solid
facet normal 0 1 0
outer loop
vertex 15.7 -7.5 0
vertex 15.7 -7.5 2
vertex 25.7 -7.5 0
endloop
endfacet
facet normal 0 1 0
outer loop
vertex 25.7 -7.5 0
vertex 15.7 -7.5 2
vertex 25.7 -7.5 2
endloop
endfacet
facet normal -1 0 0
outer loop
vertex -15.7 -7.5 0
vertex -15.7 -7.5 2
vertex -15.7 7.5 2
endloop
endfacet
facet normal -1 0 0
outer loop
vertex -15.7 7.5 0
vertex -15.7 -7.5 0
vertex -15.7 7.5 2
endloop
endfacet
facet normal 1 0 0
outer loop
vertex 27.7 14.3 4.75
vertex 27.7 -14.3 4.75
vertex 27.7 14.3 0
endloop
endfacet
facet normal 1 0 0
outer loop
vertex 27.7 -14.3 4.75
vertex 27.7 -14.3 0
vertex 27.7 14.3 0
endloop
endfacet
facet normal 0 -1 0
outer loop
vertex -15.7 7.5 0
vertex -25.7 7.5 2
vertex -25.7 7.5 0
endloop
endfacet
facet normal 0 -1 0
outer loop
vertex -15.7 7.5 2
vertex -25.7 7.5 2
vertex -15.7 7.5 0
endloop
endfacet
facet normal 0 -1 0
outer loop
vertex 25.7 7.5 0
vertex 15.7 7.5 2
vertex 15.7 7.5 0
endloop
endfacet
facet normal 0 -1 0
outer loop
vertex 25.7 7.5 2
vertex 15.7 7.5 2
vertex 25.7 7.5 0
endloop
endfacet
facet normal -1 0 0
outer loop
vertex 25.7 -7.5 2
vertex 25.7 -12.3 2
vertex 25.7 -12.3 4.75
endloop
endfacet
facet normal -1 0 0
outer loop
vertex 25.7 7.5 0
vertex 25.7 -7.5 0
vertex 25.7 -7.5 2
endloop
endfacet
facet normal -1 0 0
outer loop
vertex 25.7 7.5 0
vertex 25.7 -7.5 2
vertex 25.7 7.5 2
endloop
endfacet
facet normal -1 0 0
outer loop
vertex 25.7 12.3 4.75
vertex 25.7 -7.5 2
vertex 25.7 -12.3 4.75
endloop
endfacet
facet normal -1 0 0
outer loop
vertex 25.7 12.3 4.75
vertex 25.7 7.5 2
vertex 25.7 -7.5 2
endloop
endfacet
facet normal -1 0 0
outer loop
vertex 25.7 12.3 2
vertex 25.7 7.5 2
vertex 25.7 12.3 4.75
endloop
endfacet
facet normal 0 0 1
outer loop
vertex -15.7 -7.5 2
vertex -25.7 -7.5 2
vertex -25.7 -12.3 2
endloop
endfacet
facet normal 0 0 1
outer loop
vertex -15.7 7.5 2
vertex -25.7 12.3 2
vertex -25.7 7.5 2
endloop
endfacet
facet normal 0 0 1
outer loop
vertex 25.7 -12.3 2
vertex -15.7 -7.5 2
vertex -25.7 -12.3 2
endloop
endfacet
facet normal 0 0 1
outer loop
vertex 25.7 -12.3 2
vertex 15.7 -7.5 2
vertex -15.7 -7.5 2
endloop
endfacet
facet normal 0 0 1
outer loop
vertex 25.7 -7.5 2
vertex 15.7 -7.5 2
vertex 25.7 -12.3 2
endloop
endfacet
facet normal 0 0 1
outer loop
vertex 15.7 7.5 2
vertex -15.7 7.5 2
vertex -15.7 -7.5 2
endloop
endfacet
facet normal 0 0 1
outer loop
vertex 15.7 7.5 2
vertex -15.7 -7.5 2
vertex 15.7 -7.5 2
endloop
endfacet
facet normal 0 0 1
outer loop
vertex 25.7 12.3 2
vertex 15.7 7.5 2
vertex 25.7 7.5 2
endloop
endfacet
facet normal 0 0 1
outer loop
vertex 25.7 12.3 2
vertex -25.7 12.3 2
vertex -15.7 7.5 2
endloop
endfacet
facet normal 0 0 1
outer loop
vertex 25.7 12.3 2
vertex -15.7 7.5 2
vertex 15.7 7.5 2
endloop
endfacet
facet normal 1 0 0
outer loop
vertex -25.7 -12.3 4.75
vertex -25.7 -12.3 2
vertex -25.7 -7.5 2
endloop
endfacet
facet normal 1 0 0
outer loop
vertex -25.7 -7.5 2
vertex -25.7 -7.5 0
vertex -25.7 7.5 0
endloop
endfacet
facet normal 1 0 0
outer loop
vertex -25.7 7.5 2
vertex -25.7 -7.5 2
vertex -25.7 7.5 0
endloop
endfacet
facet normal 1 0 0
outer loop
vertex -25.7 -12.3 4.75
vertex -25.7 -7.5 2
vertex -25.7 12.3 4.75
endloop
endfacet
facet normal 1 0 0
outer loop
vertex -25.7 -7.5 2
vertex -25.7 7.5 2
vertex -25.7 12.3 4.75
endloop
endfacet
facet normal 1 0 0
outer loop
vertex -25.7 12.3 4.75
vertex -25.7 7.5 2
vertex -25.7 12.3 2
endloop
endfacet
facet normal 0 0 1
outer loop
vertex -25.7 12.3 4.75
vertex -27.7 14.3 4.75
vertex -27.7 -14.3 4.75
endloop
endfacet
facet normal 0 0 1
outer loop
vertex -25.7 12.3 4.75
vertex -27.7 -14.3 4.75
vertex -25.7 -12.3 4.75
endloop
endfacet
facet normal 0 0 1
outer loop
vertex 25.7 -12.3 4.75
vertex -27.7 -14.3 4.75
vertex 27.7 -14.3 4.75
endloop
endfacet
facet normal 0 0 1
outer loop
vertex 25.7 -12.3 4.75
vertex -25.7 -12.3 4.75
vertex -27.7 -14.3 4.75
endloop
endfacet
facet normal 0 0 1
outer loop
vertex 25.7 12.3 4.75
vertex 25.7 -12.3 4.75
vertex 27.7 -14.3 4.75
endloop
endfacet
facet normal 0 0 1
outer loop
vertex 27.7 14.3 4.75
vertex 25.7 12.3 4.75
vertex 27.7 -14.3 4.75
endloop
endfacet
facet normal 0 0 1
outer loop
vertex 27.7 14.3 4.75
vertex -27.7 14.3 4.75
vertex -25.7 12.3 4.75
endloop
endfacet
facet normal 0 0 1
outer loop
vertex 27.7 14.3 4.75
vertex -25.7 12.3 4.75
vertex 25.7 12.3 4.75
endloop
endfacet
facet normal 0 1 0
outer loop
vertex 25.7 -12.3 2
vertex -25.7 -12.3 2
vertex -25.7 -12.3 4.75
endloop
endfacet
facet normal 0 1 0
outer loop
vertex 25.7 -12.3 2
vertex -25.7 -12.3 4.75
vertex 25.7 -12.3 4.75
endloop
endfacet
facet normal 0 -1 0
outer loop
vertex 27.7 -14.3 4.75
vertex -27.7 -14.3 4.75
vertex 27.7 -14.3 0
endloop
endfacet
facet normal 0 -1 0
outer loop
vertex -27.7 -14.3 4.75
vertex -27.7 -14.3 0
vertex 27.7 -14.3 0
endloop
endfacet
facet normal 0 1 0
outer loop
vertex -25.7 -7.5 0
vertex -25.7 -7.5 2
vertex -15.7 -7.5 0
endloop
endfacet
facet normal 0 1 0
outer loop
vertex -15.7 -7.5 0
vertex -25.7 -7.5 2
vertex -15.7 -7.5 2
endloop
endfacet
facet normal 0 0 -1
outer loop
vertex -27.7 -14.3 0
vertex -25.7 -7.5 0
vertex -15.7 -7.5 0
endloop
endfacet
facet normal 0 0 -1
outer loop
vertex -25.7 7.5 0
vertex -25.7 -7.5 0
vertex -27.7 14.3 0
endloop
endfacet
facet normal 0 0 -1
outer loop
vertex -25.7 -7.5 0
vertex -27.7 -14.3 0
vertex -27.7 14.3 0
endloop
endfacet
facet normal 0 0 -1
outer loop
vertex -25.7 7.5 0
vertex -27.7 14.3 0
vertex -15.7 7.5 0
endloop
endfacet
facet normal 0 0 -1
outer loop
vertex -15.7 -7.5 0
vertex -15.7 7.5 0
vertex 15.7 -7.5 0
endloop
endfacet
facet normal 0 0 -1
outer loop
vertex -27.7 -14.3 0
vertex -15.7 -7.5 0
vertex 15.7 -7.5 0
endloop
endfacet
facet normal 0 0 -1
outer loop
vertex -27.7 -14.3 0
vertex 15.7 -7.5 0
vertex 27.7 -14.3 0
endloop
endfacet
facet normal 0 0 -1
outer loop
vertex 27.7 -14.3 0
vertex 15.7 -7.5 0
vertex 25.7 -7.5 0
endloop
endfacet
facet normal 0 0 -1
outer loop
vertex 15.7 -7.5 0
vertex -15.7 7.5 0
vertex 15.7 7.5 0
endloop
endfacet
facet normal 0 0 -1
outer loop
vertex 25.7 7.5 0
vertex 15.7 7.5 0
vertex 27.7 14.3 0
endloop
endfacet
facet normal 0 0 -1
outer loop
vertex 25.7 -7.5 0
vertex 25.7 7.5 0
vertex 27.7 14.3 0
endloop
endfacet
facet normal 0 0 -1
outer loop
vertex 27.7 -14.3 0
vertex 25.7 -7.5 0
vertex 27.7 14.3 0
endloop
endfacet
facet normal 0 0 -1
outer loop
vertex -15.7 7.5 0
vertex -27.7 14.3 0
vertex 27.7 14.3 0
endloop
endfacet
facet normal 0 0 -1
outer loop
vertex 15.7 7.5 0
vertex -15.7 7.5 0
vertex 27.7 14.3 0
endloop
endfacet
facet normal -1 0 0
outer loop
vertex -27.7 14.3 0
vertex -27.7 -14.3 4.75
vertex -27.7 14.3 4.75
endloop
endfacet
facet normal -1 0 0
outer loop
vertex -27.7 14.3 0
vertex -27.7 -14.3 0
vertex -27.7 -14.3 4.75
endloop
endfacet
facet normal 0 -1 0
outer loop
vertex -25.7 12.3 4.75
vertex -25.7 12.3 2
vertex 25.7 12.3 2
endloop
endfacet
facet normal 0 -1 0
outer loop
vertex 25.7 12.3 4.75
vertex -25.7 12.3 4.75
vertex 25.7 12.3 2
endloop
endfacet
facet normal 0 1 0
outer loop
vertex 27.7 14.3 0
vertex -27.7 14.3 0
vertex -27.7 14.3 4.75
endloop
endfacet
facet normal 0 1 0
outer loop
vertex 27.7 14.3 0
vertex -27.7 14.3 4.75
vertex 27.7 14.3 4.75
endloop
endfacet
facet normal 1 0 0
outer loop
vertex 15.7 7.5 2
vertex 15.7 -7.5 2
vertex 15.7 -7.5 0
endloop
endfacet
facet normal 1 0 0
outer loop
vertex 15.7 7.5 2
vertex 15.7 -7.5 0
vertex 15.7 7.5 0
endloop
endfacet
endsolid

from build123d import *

# Parameters (mm, degrees)
SKETCH015_W     = 55.4
SKETCH015_H     = 28.6
PAD011_DEPTH    = 2
SKETCH016_W     = 55.4
SKETCH016_H     = 28.6
SKETCH016_W_2   = 51.4
SKETCH016_H_2   = 24.6
PAD012_DEPTH    = 2.75
SKETCH019_W     = 10
SKETCH019_H     = 15
POCKET006_DEPTH = 2


with BuildPart() as part:
    # Sketch015 → Pad011 (new body)
    with BuildSketch(Plane.XY):
        Rectangle(SKETCH015_W, SKETCH015_H)
    extrude(amount=PAD011_DEPTH)

    # Sketch016 (on Face6 of Pad011) → Pad012 (join)
    with BuildSketch(Plane.XY.offset(2)):
        Rectangle(SKETCH016_W, SKETCH016_H)
        Rectangle(SKETCH016_W_2, SKETCH016_H_2, mode=Mode.SUBTRACT)
    extrude(amount=PAD012_DEPTH)

    # Sketch019 (on Face15 of Pad012) → Pocket006 (cut)
    with BuildSketch(Plane.XY.offset(2)):
        with Locations((-20.7, 0)):
            Rectangle(SKETCH019_W, SKETCH019_H)
        with Locations((20.7, 0)):
            Rectangle(SKETCH019_W, SKETCH019_H)
    extrude(amount=-POCKET006_DEPTH, mode=Mode.SUBTRACT)


solid = part.part
